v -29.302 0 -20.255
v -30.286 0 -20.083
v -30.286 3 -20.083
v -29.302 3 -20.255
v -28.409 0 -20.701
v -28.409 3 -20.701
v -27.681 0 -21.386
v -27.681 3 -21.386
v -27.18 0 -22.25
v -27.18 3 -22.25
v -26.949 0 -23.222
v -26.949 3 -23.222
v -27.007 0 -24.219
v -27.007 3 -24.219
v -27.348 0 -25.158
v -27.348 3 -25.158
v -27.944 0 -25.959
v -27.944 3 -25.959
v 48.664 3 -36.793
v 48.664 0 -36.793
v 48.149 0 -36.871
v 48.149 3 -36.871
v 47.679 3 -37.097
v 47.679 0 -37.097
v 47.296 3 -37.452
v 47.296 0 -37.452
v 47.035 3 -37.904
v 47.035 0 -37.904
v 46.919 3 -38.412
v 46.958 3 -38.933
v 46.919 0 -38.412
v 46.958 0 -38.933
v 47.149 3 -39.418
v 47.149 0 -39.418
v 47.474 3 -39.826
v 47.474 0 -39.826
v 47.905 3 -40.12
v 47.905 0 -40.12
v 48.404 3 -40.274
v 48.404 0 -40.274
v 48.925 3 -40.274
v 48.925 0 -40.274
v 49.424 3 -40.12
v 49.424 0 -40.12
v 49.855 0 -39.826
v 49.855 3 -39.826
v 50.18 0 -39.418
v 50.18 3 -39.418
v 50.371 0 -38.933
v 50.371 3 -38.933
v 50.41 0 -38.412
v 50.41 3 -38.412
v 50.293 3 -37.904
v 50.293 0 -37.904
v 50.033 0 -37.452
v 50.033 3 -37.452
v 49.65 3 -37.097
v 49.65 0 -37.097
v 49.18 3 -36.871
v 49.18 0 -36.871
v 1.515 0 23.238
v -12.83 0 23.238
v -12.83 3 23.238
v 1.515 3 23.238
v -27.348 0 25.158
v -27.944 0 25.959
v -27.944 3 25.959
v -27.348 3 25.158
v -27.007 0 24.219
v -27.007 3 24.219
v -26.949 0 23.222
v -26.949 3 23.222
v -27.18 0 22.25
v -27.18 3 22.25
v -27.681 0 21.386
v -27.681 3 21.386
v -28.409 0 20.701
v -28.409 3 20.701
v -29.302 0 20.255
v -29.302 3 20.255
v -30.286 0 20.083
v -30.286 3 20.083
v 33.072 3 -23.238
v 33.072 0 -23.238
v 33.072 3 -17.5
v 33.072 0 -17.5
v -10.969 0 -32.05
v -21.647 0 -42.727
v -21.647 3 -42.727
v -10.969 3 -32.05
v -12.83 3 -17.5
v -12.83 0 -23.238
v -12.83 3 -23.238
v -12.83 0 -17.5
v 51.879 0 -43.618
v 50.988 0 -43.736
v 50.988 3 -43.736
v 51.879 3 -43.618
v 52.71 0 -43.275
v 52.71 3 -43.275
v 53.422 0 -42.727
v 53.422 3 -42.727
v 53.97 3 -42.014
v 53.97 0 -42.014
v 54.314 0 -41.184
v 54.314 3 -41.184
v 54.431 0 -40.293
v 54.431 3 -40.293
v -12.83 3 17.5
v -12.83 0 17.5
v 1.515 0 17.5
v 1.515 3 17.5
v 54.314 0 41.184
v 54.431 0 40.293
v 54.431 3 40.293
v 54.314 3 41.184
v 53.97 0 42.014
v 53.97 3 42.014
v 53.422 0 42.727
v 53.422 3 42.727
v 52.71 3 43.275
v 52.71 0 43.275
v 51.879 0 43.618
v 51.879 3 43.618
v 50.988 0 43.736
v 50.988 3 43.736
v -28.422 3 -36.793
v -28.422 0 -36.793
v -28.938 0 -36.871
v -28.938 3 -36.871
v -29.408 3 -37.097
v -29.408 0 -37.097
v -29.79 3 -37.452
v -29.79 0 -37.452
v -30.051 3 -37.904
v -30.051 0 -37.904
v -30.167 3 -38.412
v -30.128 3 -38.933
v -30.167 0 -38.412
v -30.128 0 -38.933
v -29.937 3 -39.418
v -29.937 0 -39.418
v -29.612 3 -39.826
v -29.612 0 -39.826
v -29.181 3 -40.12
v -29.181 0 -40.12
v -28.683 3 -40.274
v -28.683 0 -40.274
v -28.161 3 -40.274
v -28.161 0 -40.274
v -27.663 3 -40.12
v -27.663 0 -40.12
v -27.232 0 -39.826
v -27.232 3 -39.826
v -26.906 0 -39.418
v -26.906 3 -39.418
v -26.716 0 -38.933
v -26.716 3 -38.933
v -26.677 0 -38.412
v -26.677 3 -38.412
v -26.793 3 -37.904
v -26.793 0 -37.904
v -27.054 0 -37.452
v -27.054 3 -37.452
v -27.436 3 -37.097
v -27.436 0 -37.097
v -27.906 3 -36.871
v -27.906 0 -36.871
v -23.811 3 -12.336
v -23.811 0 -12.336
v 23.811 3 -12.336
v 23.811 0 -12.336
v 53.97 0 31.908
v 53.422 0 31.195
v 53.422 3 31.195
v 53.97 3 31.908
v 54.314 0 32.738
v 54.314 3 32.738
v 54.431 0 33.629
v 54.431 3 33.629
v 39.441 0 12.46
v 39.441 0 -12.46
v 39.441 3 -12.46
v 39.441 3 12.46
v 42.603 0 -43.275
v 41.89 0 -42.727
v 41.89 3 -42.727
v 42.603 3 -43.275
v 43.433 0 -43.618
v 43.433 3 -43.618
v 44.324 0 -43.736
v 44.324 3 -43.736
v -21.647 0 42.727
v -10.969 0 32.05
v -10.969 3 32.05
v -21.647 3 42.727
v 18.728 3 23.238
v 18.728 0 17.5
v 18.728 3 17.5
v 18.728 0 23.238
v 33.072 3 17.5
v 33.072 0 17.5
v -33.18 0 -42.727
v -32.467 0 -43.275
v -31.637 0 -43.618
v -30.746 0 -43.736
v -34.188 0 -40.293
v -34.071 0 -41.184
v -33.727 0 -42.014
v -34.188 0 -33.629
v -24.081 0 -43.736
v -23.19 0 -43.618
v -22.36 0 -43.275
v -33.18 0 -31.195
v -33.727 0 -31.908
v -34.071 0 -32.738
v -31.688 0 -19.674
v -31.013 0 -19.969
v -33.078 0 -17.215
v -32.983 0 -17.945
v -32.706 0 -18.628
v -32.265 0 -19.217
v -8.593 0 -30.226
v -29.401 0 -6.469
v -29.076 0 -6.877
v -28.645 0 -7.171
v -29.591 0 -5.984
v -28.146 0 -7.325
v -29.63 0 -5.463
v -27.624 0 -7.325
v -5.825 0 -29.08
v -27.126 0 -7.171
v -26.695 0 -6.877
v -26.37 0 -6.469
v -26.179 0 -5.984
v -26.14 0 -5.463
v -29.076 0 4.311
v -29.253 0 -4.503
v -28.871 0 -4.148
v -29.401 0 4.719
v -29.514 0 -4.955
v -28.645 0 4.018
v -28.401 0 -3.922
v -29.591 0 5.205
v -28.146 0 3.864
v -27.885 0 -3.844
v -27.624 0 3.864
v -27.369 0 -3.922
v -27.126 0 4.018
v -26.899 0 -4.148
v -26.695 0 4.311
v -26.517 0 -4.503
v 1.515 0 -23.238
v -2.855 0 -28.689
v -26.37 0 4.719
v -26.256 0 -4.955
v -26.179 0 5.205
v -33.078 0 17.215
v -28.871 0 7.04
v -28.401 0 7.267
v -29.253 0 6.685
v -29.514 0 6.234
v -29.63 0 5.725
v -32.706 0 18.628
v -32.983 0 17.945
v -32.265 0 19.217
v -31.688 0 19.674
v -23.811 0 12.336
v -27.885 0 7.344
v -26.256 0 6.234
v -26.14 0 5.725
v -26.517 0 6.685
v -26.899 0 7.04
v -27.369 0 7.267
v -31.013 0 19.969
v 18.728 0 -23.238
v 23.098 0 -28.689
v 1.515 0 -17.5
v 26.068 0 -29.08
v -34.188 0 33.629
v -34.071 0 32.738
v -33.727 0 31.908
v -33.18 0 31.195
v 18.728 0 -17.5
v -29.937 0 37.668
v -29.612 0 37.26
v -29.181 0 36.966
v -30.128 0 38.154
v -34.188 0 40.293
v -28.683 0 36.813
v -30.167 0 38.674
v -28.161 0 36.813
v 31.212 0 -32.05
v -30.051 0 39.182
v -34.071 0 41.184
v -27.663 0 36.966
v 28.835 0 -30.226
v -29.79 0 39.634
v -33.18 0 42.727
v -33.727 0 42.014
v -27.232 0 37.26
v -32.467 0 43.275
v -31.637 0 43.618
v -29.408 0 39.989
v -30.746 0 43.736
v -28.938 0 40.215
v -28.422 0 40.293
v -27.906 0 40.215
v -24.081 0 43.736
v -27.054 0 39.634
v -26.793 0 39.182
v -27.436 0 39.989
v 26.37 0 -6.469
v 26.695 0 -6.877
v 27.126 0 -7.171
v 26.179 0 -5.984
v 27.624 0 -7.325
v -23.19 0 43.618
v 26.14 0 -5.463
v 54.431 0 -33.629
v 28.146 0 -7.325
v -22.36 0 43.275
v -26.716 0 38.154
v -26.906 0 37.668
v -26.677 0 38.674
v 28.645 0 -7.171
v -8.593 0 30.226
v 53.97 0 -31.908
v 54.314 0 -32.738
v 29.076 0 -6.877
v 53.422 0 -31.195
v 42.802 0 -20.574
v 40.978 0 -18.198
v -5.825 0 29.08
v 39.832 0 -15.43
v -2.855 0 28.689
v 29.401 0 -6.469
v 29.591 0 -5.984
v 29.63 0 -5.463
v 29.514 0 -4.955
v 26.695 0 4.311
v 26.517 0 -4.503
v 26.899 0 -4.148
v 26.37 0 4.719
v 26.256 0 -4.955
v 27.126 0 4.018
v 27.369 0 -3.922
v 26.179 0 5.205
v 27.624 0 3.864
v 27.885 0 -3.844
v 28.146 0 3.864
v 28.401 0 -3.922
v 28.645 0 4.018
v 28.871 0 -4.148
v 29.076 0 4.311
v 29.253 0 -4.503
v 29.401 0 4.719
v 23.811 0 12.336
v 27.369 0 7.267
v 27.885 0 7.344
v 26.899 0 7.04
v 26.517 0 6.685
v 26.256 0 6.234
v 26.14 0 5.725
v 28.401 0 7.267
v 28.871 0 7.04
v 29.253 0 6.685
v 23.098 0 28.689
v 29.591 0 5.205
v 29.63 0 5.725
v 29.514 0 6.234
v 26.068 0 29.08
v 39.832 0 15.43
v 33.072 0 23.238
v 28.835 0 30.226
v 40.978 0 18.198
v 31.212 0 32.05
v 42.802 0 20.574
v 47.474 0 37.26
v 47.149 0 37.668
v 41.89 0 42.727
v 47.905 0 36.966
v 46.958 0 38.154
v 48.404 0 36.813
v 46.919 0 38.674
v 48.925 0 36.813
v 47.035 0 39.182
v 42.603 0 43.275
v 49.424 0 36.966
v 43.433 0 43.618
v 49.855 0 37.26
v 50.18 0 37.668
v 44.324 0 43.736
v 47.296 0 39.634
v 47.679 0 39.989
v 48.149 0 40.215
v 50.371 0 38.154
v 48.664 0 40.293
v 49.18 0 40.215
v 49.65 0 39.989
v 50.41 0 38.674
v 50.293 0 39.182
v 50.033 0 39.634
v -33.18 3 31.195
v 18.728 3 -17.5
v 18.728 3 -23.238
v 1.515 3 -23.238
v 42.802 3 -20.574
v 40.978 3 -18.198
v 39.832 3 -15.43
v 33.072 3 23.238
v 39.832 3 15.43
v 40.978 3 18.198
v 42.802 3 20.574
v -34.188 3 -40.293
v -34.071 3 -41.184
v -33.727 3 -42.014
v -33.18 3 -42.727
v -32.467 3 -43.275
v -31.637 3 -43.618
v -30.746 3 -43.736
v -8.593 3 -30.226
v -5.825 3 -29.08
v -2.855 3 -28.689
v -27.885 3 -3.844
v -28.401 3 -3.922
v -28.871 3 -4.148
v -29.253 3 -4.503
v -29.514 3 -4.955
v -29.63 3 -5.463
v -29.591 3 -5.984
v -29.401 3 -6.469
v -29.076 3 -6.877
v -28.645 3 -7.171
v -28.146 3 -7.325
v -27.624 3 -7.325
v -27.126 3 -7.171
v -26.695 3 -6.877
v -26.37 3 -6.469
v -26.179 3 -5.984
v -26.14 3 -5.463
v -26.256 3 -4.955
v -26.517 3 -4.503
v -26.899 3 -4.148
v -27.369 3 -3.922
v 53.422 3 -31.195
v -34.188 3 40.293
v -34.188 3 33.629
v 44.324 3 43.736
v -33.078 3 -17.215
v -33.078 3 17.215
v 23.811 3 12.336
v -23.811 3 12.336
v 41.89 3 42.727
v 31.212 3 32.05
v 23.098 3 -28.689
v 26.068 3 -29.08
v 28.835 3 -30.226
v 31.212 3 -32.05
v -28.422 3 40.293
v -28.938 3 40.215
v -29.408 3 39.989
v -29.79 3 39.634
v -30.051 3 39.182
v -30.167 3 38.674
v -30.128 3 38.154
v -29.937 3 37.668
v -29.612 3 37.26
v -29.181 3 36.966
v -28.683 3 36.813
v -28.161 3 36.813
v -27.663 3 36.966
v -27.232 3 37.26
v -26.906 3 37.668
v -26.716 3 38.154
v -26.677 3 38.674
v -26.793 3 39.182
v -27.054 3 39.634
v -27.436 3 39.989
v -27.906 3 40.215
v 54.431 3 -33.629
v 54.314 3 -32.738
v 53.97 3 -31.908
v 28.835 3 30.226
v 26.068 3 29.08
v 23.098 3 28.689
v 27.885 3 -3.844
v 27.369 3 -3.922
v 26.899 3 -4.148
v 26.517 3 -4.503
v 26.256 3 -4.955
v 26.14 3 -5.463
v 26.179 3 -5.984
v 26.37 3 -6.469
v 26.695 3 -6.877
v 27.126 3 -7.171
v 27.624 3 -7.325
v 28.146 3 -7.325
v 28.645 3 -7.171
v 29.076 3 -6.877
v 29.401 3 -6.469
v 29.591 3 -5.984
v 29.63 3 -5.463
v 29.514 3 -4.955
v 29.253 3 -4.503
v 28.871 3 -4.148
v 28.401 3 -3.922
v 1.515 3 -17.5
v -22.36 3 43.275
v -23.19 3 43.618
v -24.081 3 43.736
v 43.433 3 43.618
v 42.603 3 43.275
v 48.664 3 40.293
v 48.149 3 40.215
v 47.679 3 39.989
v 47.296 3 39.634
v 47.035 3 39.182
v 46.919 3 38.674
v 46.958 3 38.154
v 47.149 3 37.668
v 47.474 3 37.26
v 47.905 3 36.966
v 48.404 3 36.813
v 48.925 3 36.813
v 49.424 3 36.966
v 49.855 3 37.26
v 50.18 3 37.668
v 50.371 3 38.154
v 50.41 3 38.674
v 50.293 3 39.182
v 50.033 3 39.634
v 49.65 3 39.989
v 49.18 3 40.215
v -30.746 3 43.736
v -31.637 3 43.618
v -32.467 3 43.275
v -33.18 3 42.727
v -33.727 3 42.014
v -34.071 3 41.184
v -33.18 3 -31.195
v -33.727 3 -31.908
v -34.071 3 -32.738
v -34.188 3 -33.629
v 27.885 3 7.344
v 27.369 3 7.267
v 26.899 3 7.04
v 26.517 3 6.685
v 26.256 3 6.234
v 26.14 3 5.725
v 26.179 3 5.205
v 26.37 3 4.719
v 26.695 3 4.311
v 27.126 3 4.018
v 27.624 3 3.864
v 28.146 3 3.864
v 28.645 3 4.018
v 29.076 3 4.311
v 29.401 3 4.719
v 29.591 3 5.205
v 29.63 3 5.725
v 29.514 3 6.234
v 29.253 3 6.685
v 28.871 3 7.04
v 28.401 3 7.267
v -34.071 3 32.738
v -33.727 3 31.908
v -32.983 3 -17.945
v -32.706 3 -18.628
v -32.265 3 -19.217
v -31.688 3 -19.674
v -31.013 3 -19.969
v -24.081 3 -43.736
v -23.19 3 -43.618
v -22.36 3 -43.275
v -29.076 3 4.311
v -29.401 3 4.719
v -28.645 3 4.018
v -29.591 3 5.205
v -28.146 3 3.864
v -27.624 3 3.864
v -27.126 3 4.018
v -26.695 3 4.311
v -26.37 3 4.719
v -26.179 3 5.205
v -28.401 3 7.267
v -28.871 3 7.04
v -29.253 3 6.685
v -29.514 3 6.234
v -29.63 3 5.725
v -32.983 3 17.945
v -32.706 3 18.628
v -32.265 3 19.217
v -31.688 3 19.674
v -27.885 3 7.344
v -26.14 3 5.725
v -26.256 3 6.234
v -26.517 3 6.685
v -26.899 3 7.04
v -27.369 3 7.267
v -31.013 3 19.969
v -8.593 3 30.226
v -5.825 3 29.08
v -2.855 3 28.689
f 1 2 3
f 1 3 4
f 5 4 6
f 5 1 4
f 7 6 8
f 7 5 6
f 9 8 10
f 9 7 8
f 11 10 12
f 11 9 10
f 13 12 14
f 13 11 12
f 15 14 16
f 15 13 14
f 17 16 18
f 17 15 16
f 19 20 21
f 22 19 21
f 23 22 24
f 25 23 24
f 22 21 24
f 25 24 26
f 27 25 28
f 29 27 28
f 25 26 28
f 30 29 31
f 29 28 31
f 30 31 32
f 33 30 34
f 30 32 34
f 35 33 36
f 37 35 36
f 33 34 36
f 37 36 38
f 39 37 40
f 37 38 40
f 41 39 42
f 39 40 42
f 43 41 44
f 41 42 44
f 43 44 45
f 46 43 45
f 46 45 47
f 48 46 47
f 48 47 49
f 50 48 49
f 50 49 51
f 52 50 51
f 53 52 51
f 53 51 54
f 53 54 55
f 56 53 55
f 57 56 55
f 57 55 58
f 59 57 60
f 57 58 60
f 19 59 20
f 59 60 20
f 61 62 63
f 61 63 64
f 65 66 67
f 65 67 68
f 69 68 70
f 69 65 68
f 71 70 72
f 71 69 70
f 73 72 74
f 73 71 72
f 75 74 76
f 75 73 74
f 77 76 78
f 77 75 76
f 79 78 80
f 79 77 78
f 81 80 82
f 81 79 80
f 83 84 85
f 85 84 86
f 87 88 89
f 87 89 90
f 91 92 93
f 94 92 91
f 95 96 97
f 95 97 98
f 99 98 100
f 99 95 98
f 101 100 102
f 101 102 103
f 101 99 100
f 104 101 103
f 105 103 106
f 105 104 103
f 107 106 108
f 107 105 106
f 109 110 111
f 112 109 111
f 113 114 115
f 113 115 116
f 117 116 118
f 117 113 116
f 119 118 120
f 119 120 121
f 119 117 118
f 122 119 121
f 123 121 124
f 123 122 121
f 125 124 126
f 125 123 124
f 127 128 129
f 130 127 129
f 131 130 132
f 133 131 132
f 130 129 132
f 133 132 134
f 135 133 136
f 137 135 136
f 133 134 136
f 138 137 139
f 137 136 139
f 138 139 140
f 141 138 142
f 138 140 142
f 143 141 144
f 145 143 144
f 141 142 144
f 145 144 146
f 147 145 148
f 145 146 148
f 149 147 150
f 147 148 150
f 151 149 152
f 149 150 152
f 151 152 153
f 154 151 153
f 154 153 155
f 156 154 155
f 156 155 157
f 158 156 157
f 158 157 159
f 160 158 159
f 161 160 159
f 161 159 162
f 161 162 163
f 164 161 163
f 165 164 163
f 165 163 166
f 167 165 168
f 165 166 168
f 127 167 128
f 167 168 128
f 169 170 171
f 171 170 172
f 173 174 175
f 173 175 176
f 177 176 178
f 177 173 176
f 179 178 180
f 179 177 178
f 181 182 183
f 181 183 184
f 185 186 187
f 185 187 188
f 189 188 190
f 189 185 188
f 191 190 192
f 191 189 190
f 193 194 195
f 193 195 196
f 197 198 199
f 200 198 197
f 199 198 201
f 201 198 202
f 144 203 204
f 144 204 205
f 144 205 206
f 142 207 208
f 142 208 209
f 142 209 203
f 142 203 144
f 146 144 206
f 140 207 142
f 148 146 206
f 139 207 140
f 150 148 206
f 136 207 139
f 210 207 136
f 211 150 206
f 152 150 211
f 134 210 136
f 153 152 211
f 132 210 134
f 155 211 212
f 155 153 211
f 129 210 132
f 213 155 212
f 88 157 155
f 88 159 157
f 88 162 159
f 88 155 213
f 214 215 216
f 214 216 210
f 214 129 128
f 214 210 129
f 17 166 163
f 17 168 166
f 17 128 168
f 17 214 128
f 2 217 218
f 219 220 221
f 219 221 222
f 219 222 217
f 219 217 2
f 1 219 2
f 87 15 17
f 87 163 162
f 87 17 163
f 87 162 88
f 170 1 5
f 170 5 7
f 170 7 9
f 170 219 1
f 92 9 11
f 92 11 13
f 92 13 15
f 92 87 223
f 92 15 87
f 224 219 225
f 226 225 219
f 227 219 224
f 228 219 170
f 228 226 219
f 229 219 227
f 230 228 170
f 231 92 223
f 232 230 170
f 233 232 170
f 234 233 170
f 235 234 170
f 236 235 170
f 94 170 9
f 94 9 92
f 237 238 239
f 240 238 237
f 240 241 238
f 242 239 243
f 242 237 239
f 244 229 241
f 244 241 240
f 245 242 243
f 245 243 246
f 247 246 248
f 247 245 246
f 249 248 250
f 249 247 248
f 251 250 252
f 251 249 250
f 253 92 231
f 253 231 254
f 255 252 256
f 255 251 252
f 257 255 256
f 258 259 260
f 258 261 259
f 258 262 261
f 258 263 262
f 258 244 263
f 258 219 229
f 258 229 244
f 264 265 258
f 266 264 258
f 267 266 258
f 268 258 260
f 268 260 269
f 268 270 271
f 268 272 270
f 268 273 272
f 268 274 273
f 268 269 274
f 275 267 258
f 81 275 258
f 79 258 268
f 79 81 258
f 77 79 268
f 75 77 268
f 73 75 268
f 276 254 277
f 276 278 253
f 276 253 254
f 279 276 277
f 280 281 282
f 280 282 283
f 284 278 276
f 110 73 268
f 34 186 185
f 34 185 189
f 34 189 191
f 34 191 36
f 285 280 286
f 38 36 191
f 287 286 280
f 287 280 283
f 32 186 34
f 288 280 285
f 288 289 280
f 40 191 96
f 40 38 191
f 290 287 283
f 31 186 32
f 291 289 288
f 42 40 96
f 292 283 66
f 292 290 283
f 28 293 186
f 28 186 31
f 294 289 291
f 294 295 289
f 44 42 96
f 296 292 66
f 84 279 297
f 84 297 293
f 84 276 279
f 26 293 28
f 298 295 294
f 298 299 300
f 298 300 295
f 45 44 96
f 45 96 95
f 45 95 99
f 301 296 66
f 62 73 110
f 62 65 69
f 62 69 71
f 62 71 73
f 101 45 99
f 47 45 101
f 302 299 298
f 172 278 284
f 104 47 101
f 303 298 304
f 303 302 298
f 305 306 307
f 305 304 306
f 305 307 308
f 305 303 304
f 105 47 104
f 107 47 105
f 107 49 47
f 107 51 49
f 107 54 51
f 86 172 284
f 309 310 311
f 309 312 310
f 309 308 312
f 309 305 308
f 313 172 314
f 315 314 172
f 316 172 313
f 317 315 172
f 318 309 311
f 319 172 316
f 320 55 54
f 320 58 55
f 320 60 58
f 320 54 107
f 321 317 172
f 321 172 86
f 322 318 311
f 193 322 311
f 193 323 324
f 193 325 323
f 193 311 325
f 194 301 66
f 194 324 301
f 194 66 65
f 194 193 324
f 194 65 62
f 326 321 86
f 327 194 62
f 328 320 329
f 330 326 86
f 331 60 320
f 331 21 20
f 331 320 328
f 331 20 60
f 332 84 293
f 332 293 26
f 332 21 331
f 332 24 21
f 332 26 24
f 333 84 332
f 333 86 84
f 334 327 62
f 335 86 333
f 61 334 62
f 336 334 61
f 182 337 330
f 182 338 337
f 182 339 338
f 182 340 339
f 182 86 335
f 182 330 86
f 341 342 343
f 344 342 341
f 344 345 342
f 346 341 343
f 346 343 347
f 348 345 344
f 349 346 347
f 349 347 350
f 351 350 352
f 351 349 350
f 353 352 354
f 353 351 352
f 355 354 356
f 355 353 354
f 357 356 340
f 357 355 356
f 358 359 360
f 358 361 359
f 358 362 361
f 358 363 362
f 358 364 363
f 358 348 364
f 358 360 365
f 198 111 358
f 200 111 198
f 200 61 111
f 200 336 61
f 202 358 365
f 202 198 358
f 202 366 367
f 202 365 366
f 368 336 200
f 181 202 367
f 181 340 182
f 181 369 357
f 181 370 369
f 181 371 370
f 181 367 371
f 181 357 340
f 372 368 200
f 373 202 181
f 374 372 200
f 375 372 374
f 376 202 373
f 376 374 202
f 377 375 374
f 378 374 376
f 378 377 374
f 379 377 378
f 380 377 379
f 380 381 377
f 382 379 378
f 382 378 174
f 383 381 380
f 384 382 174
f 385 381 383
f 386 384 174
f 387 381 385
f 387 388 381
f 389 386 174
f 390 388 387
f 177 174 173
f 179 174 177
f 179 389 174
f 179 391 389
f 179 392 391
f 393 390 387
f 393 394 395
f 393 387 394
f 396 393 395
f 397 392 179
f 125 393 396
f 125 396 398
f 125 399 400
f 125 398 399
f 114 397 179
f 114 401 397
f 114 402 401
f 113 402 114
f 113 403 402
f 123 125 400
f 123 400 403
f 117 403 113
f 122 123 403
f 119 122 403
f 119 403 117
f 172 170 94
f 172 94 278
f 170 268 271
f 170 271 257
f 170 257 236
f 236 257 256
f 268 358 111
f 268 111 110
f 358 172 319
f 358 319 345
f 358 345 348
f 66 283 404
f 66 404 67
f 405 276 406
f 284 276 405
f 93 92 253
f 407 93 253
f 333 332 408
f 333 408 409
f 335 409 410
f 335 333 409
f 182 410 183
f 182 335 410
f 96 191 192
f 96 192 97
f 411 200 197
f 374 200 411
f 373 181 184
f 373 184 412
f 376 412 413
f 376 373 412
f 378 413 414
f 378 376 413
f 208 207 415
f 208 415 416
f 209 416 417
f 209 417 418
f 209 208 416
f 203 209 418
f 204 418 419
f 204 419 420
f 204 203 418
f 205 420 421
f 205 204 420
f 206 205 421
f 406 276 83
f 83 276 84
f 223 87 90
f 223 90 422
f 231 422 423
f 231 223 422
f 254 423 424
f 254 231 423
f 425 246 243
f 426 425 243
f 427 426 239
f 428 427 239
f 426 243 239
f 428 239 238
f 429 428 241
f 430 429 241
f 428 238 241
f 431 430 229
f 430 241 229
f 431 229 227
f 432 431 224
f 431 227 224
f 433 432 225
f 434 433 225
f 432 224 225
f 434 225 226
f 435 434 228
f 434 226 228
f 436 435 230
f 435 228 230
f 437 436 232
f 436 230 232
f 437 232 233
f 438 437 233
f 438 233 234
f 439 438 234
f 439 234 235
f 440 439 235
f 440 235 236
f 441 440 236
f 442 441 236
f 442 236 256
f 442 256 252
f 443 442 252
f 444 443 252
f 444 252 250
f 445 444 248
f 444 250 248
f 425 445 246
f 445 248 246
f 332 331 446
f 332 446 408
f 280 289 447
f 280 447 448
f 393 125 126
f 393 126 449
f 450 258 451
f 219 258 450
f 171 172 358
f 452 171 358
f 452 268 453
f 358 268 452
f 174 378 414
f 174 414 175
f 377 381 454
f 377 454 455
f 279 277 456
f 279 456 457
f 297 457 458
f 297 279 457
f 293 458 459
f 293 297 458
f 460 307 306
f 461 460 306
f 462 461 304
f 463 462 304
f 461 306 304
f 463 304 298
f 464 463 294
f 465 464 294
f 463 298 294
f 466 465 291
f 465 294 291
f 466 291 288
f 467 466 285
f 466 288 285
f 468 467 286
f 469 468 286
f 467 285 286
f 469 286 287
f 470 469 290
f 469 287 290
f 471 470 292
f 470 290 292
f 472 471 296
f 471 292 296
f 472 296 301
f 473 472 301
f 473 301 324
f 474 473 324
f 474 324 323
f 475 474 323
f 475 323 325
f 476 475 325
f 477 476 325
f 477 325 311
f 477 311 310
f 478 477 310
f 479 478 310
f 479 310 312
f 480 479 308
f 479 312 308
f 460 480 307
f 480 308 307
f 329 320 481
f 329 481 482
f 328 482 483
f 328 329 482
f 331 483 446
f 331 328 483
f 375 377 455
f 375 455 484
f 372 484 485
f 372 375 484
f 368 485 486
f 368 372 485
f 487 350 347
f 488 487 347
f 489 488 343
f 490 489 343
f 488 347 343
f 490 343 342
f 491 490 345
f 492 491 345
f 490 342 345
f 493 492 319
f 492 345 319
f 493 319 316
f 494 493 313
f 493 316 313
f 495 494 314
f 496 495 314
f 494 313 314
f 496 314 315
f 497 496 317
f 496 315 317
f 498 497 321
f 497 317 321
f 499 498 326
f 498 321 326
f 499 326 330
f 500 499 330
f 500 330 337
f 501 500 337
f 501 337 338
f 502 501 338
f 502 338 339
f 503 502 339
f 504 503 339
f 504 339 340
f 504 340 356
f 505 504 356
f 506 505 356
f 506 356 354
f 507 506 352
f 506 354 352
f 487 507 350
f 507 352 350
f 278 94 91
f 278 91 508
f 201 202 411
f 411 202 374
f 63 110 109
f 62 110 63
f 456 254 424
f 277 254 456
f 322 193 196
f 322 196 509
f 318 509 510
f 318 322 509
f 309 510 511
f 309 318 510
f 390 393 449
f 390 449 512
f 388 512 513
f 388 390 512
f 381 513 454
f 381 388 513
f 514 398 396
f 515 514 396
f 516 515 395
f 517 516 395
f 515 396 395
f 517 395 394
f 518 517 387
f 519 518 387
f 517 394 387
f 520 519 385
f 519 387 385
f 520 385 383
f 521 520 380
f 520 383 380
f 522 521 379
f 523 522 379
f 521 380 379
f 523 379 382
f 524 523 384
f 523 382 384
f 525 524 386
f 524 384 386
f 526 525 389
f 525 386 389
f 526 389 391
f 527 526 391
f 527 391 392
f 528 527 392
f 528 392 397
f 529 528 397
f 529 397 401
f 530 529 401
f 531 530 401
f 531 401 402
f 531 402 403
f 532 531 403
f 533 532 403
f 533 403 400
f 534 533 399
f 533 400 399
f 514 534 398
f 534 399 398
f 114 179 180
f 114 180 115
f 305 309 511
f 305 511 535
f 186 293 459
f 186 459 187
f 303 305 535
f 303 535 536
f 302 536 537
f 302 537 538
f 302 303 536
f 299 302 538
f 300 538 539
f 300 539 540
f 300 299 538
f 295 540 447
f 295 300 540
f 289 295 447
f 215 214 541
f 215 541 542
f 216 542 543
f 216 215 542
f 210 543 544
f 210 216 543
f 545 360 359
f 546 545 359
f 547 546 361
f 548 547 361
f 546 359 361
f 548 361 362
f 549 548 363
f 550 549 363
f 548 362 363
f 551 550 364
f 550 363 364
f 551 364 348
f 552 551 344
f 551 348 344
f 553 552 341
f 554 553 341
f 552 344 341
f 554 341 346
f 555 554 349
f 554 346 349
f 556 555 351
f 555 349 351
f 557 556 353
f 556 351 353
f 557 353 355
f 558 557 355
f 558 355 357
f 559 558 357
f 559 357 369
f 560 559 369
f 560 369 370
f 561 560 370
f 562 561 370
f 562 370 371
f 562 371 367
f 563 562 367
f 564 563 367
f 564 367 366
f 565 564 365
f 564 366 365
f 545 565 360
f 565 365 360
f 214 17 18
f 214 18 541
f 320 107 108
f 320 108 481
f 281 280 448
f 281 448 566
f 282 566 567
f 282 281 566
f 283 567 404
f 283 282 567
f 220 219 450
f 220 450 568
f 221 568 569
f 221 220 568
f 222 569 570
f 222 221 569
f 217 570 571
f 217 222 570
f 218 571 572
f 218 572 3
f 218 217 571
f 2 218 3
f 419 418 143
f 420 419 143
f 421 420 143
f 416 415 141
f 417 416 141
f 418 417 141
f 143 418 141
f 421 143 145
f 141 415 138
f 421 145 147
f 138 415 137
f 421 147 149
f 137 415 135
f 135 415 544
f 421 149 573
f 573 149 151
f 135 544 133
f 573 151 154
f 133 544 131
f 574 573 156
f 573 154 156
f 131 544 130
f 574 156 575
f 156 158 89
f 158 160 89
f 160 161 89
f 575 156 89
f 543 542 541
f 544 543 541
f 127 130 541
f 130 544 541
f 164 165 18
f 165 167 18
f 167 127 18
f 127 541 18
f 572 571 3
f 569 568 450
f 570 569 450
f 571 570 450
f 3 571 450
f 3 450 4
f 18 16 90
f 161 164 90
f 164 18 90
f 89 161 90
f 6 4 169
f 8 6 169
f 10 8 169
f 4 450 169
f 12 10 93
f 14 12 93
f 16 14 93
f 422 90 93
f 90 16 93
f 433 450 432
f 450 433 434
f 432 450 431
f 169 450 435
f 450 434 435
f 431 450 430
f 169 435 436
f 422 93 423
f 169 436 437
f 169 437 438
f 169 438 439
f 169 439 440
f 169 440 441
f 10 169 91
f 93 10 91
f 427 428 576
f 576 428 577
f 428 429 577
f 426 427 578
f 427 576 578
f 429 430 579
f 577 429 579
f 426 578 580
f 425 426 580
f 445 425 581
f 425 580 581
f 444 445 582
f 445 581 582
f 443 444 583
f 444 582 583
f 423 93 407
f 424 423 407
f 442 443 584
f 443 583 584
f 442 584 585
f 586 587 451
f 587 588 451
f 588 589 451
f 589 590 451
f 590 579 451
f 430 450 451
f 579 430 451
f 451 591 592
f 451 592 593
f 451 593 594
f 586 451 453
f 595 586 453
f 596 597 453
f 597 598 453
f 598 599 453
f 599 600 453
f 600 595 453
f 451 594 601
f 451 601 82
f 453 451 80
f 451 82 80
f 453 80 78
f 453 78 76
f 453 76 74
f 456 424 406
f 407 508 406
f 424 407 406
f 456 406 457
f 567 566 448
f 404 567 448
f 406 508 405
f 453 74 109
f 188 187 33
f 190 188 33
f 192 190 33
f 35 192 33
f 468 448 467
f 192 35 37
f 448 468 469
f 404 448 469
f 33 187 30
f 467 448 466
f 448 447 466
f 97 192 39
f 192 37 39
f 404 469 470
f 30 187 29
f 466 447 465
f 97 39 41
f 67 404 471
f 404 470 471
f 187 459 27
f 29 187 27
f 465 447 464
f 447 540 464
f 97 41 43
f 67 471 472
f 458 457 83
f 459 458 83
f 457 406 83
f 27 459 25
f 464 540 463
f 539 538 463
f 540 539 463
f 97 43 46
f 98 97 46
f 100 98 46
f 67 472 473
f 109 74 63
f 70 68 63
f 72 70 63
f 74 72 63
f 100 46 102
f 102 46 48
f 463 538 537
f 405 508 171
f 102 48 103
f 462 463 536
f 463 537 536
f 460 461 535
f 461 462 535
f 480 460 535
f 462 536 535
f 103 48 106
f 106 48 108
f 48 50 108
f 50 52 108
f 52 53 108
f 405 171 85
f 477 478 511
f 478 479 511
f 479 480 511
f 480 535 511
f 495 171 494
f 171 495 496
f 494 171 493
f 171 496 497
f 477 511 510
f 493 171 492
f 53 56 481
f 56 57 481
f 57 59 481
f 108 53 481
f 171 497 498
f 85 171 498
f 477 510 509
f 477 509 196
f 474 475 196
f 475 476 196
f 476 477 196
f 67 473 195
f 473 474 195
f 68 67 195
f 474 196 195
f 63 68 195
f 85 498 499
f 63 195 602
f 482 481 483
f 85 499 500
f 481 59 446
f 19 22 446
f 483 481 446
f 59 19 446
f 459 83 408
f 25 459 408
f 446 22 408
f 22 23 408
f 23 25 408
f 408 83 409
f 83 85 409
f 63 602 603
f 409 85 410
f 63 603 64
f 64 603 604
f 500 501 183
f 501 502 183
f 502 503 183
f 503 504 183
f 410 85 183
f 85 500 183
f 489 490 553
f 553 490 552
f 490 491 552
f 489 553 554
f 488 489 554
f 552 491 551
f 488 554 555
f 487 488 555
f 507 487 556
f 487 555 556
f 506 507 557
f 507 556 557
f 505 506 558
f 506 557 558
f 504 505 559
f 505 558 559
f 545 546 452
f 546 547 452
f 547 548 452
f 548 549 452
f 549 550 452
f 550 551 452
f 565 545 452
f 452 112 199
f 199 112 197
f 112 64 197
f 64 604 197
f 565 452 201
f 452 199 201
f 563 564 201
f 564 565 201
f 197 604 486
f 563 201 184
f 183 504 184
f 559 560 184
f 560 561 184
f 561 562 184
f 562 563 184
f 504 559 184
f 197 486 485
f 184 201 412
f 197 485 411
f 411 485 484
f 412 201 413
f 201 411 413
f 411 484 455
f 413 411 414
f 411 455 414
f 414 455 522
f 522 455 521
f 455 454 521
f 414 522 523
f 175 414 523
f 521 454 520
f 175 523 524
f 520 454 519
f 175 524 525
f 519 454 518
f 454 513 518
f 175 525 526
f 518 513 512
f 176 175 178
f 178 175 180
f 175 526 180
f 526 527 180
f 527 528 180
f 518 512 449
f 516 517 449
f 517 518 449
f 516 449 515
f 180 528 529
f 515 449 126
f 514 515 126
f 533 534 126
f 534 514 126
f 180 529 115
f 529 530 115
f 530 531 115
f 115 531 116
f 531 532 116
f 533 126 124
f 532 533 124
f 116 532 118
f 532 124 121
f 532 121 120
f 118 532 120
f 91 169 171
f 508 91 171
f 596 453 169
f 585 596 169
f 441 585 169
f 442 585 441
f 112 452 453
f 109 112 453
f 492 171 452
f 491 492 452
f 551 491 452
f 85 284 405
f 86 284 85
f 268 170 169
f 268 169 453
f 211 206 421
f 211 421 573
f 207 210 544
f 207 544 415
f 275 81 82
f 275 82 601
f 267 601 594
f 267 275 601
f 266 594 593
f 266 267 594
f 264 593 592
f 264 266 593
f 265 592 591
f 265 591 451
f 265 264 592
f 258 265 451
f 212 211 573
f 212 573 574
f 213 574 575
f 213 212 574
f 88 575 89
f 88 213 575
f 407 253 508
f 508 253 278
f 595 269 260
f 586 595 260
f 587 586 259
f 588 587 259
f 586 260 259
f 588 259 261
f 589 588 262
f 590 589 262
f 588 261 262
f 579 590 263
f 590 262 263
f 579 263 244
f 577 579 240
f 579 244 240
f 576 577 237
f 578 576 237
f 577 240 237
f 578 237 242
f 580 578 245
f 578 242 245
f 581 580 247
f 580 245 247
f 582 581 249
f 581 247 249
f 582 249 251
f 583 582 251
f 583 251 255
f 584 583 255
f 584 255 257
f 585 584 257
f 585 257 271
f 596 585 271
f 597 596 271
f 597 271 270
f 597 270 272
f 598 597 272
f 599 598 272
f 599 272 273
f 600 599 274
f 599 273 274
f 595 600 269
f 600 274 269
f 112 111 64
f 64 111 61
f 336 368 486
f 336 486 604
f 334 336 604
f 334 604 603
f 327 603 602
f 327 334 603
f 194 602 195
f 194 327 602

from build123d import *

# Parameters (mm, degrees)
SKETCH_1_R      = 1.75
SKETCH_1_W      = 14.344262296
SKETCH_1_H      = 5.737704918
SKETCH_1_W_2    = 14.344262295
SKETCH_1_W_3    = 47.62295082
SKETCH_1_H_2    = 24.672131148
EXTRUDE_1_DEPTH = 3


with BuildPart() as part:
    # 草图1 → 凸台-拉伸1 (new body)
    with BuildSketch(Plane.XZ):
        with BuildLine():
            Line((-27.944138099, -25.958892198), (-33.179876582, -31.19463068))
            ThreePointArc((-33.179876582, -31.19463068), (-33.926143431, -32.311497947), (-34.188197499, -33.628932714))
            Line((-34.188197499, -33.628932714), (-34.188197499, -40.293115532))
            ThreePointArc((-34.188197499, -40.293115532), (-33.179876582, -42.727417565), (-30.745574548, -43.735738483))
            Line((-30.745574548, -43.735738483), (-24.08139173, -43.735738483))
            ThreePointArc((-24.08139173, -43.735738483), (-22.763956963, -43.473684414), (-21.647089697, -42.727417565))
            Line((-21.647089697, -42.727417565), (-10.969266445, -32.049594314))
            ThreePointArc((-10.969266445, -32.049594314), (-7.246375557, -29.562038152), (-2.854926333, -28.68852459))
            Line((-2.854926333, -28.68852459), (23.097549284, -28.68852459))
            ThreePointArc((23.097549284, -28.68852459), (27.488998508, -29.562038152), (31.211889396, -32.049594314))
            Line((31.211889396, -32.049594314), (41.889712647, -42.727417565))
            ThreePointArc((41.889712647, -42.727417565), (43.006579914, -43.473684414), (44.324014681, -43.735738483))
            Line((44.324014681, -43.735738483), (50.988197499, -43.735738483))
            ThreePointArc((50.988197499, -43.735738483), (53.422499533, -42.727417565), (54.43082045, -40.293115532))
            Line((54.43082045, -40.293115532), (54.43082045, -33.628932714))
            ThreePointArc((54.43082045, -33.628932714), (54.168766382, -32.311497947), (53.422499533, -31.19463068))
            Line((53.422499533, -31.19463068), (42.802053331, -20.574184478))
            ThreePointArc((42.802053331, -20.574184478), (40.314497168, -16.85129359), (39.440983607, -12.459844366))
            Line((39.440983607, -12.459844366), (39.440983607, 12.459844366))
            ThreePointArc((39.440983607, 12.459844366), (40.314497168, 16.85129359), (42.802053331, 20.574184478))
            Line((42.802053331, 20.574184478), (53.422499533, 31.19463068))
            ThreePointArc((53.422499533, 31.19463068), (54.168766382, 32.311497947), (54.43082045, 33.628932714))
            Line((54.43082045, 33.628932714), (54.43082045, 40.293115532))
            ThreePointArc((54.43082045, 40.293115532), (53.422499533, 42.727417565), (50.988197499, 43.735738483))
            Line((50.988197499, 43.735738483), (44.324014681, 43.735738483))
            ThreePointArc((44.324014681, 43.735738483), (43.006579914, 43.473684414), (41.889712647, 42.727417565))
            Line((41.889712647, 42.727417565), (31.211889396, 32.049594314))
            ThreePointArc((31.211889396, 32.049594314), (27.488998508, 29.562038152), (23.097549284, 28.68852459))
            Line((23.097549284, 28.68852459), (-2.854926333, 28.68852459))
            ThreePointArc((-2.854926333, 28.68852459), (-7.246375557, 29.562038152), (-10.969266445, 32.049594314))
            Line((-10.969266445, 32.049594314), (-21.647089697, 42.727417565))
            ThreePointArc((-21.647089697, 42.727417565), (-22.763956963, 43.473684414), (-24.08139173, 43.735738483))
            Line((-24.08139173, 43.735738483), (-30.745574548, 43.735738483))
            ThreePointArc((-30.745574548, 43.735738483), (-33.179876582, 42.727417565), (-34.188197499, 40.293115532))
            Line((-34.188197499, 40.293115532), (-34.188197499, 33.628932714))
            ThreePointArc((-34.188197499, 33.628932714), (-33.926143431, 32.311497947), (-33.179876582, 31.19463068))
            Line((-33.179876582, 31.19463068), (-27.944138099, 25.958892198))
            ThreePointArc((-27.944138099, 25.958892198), (-27.180473754, 22.249967152), (-30.286027184, 20.083207792))
            ThreePointArc((-30.286027184, 20.083207792), (-32.264648538, 19.216561535), (-33.077868852, 17.215389149))
            Line((-33.077868852, 17.215389149), (-33.077868852, -17.215389149))
            ThreePointArc((-33.077868852, -17.215389149), (-32.264648538, -19.216561535), (-30.286027184, -20.083207792))
            ThreePointArc((-30.286027184, -20.083207792), (-27.180473754, -22.249967152), (-27.944138099, -25.958892198))
        make_face()
        with Locations(Location((48.664427007, 38.543115532, 0), (0, 0, 90))):
            Circle(SKETCH_1_R, mode=Mode.SUBTRACT)
        with Locations(Location((-28.421804056, -38.543115532, 0), (0, 0, 90))):
            Circle(SKETCH_1_R, mode=Mode.SUBTRACT)
        with Locations(Location((27.885245902, 5.594262295, 0), (0, 0, 90))):
            Circle(SKETCH_1_R, mode=Mode.SUBTRACT)
        with Locations(Location((-27.885245902, 5.594262295, 0), (0, 0, 90))):
            Circle(SKETCH_1_R, mode=Mode.SUBTRACT)
        with Locations(Location((-27.885245902, -5.594262295, 0), (0, 0, 90))):
            Circle(SKETCH_1_R, mode=Mode.SUBTRACT)
        with Locations(Location((27.885245902, -5.594262295, 0), (0, 0, 90))):
            Circle(SKETCH_1_R, mode=Mode.SUBTRACT)
        with Locations(Location((48.664427007, -38.543115532, 0), (0, 0, 90))):
            Circle(SKETCH_1_R, mode=Mode.SUBTRACT)
        with Locations(Location((-28.421804056, 38.543115532, 0), (0, 0, 90))):
            Circle(SKETCH_1_R, mode=Mode.SUBTRACT)
        with Locations((25.9, -20.368852459)):
            Rectangle(SKETCH_1_W, SKETCH_1_H, mode=Mode.SUBTRACT)
        with Locations((-5.65737705, 20.368852459)):
            Rectangle(SKETCH_1_W_2, SKETCH_1_H, mode=Mode.SUBTRACT)
        Rectangle(SKETCH_1_W_3, SKETCH_1_H_2, mode=Mode.SUBTRACT)
        with Locations((25.9, 20.368852459)):
            Rectangle(SKETCH_1_W, SKETCH_1_H, mode=Mode.SUBTRACT)
        with Locations((-5.65737705, -20.368852459)):
            Rectangle(SKETCH_1_W_2, SKETCH_1_H, mode=Mode.SUBTRACT)
    extrude(amount=-EXTRUDE_1_DEPTH)


solid = part.part
